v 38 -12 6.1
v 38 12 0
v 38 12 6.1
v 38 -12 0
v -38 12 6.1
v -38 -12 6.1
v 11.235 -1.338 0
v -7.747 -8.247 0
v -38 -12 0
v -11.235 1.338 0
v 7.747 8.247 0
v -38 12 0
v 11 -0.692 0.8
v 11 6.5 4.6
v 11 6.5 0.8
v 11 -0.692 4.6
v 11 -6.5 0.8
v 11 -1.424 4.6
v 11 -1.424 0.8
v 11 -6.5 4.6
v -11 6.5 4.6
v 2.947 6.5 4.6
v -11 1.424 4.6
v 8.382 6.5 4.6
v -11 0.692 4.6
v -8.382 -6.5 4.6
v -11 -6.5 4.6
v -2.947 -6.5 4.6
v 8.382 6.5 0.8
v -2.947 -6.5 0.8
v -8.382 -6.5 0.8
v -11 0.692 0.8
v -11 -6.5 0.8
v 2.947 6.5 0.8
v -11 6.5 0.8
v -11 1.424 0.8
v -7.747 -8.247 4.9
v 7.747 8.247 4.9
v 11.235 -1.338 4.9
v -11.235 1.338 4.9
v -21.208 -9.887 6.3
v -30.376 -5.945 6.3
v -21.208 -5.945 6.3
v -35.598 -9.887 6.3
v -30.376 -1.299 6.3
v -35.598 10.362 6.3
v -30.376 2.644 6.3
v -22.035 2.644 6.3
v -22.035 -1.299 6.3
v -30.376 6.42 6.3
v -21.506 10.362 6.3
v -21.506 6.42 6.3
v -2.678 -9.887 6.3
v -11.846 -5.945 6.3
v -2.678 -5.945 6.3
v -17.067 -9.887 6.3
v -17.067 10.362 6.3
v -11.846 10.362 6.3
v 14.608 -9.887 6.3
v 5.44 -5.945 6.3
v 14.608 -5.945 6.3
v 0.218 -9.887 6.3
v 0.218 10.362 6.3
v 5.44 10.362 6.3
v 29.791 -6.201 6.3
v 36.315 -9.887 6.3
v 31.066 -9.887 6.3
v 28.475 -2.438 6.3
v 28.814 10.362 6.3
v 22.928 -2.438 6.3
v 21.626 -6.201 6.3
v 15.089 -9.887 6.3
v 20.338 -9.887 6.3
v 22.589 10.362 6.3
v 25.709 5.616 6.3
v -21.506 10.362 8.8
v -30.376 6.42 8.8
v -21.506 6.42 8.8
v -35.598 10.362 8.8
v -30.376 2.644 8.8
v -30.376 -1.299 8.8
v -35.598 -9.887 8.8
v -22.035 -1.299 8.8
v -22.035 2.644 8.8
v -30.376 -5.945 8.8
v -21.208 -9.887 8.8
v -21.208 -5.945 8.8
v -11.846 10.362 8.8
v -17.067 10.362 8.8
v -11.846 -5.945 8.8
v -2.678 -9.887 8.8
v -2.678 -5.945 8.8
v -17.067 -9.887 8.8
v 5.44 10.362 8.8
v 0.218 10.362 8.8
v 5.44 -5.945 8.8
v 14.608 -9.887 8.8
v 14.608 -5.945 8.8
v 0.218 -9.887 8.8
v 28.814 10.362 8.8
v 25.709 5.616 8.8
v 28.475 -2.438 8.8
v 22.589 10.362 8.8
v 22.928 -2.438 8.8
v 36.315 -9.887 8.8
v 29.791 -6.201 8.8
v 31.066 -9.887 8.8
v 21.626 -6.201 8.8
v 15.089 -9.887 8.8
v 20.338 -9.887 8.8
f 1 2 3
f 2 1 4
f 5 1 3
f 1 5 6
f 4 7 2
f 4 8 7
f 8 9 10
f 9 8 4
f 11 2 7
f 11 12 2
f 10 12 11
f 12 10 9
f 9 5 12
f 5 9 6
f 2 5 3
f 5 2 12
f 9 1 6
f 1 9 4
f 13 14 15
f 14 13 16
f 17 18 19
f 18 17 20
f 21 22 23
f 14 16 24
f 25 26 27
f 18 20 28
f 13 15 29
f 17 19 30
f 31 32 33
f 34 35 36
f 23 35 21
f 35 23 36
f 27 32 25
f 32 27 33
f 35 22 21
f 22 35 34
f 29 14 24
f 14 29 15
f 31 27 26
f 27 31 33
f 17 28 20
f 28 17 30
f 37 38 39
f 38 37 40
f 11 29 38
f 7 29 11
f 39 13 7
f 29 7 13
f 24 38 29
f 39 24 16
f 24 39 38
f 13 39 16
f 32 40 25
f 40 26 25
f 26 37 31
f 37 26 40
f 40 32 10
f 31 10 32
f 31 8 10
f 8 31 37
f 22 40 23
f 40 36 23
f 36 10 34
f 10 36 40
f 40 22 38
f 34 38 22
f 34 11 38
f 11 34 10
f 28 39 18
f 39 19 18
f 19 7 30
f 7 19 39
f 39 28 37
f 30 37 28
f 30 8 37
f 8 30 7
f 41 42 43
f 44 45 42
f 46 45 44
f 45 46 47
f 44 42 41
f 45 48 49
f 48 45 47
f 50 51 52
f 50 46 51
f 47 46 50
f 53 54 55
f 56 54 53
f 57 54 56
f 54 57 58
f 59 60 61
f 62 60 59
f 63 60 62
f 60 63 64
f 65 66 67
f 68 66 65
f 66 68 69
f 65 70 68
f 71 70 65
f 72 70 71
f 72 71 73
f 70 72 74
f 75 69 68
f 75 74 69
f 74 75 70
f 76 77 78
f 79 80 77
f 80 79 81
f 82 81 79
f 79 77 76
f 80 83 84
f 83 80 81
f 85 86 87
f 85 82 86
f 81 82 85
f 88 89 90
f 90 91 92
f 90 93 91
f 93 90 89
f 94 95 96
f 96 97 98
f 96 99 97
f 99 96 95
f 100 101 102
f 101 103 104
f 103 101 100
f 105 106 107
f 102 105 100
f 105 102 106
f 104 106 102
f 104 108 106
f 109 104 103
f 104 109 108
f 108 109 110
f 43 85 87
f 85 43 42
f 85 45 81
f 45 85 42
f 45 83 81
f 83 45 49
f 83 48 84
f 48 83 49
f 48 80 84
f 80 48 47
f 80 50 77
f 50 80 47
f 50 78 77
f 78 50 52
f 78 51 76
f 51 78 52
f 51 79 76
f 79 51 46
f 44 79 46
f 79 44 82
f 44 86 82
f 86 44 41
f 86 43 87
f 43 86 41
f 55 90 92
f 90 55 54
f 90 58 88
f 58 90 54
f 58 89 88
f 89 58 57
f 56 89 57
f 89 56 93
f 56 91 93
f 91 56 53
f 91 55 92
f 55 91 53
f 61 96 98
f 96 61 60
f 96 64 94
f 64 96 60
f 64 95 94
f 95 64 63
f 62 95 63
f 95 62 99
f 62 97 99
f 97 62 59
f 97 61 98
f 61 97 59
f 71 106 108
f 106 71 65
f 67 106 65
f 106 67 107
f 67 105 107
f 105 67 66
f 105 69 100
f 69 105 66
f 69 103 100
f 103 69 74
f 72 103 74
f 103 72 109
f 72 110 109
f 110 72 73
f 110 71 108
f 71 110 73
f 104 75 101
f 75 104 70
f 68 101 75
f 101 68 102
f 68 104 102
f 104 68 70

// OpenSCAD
block_text = "ELLA";
//block_text = "E\u2618";
layer_height = 0.1; // The letters "float" above the block so that it does a solid fill
left_wiggle = -1.1; //Adjust to center the letters properly
font_kern = 0.9; //ratio of width to height
font = "Ubuntu Bold:style=bold";
letter_size = 20;
block_height = 6.1;
text_height = 2.5;
border = 2;
difference() {
    translate([0,0,block_height/2]) cube([len(block_text)*letter_size*font_kern+2*border,letter_size+2*border,block_height],true);
    // The pocket is based on a 10x20x3.75mm magnet
    translate([-11,-6.5,0.8]) cube([22,13,3.8]);
    rotate([0,0,20]) translate([-10.1,-5.1,0]) cube([20.2,10.2,4.9]);
}
translate([left_wiggle,0,block_height+2*layer_height]) linear_extrude(height=text_height) text(block_text, size = letter_size, font = font, halign = "center", valign = "center", $fn = 40);
